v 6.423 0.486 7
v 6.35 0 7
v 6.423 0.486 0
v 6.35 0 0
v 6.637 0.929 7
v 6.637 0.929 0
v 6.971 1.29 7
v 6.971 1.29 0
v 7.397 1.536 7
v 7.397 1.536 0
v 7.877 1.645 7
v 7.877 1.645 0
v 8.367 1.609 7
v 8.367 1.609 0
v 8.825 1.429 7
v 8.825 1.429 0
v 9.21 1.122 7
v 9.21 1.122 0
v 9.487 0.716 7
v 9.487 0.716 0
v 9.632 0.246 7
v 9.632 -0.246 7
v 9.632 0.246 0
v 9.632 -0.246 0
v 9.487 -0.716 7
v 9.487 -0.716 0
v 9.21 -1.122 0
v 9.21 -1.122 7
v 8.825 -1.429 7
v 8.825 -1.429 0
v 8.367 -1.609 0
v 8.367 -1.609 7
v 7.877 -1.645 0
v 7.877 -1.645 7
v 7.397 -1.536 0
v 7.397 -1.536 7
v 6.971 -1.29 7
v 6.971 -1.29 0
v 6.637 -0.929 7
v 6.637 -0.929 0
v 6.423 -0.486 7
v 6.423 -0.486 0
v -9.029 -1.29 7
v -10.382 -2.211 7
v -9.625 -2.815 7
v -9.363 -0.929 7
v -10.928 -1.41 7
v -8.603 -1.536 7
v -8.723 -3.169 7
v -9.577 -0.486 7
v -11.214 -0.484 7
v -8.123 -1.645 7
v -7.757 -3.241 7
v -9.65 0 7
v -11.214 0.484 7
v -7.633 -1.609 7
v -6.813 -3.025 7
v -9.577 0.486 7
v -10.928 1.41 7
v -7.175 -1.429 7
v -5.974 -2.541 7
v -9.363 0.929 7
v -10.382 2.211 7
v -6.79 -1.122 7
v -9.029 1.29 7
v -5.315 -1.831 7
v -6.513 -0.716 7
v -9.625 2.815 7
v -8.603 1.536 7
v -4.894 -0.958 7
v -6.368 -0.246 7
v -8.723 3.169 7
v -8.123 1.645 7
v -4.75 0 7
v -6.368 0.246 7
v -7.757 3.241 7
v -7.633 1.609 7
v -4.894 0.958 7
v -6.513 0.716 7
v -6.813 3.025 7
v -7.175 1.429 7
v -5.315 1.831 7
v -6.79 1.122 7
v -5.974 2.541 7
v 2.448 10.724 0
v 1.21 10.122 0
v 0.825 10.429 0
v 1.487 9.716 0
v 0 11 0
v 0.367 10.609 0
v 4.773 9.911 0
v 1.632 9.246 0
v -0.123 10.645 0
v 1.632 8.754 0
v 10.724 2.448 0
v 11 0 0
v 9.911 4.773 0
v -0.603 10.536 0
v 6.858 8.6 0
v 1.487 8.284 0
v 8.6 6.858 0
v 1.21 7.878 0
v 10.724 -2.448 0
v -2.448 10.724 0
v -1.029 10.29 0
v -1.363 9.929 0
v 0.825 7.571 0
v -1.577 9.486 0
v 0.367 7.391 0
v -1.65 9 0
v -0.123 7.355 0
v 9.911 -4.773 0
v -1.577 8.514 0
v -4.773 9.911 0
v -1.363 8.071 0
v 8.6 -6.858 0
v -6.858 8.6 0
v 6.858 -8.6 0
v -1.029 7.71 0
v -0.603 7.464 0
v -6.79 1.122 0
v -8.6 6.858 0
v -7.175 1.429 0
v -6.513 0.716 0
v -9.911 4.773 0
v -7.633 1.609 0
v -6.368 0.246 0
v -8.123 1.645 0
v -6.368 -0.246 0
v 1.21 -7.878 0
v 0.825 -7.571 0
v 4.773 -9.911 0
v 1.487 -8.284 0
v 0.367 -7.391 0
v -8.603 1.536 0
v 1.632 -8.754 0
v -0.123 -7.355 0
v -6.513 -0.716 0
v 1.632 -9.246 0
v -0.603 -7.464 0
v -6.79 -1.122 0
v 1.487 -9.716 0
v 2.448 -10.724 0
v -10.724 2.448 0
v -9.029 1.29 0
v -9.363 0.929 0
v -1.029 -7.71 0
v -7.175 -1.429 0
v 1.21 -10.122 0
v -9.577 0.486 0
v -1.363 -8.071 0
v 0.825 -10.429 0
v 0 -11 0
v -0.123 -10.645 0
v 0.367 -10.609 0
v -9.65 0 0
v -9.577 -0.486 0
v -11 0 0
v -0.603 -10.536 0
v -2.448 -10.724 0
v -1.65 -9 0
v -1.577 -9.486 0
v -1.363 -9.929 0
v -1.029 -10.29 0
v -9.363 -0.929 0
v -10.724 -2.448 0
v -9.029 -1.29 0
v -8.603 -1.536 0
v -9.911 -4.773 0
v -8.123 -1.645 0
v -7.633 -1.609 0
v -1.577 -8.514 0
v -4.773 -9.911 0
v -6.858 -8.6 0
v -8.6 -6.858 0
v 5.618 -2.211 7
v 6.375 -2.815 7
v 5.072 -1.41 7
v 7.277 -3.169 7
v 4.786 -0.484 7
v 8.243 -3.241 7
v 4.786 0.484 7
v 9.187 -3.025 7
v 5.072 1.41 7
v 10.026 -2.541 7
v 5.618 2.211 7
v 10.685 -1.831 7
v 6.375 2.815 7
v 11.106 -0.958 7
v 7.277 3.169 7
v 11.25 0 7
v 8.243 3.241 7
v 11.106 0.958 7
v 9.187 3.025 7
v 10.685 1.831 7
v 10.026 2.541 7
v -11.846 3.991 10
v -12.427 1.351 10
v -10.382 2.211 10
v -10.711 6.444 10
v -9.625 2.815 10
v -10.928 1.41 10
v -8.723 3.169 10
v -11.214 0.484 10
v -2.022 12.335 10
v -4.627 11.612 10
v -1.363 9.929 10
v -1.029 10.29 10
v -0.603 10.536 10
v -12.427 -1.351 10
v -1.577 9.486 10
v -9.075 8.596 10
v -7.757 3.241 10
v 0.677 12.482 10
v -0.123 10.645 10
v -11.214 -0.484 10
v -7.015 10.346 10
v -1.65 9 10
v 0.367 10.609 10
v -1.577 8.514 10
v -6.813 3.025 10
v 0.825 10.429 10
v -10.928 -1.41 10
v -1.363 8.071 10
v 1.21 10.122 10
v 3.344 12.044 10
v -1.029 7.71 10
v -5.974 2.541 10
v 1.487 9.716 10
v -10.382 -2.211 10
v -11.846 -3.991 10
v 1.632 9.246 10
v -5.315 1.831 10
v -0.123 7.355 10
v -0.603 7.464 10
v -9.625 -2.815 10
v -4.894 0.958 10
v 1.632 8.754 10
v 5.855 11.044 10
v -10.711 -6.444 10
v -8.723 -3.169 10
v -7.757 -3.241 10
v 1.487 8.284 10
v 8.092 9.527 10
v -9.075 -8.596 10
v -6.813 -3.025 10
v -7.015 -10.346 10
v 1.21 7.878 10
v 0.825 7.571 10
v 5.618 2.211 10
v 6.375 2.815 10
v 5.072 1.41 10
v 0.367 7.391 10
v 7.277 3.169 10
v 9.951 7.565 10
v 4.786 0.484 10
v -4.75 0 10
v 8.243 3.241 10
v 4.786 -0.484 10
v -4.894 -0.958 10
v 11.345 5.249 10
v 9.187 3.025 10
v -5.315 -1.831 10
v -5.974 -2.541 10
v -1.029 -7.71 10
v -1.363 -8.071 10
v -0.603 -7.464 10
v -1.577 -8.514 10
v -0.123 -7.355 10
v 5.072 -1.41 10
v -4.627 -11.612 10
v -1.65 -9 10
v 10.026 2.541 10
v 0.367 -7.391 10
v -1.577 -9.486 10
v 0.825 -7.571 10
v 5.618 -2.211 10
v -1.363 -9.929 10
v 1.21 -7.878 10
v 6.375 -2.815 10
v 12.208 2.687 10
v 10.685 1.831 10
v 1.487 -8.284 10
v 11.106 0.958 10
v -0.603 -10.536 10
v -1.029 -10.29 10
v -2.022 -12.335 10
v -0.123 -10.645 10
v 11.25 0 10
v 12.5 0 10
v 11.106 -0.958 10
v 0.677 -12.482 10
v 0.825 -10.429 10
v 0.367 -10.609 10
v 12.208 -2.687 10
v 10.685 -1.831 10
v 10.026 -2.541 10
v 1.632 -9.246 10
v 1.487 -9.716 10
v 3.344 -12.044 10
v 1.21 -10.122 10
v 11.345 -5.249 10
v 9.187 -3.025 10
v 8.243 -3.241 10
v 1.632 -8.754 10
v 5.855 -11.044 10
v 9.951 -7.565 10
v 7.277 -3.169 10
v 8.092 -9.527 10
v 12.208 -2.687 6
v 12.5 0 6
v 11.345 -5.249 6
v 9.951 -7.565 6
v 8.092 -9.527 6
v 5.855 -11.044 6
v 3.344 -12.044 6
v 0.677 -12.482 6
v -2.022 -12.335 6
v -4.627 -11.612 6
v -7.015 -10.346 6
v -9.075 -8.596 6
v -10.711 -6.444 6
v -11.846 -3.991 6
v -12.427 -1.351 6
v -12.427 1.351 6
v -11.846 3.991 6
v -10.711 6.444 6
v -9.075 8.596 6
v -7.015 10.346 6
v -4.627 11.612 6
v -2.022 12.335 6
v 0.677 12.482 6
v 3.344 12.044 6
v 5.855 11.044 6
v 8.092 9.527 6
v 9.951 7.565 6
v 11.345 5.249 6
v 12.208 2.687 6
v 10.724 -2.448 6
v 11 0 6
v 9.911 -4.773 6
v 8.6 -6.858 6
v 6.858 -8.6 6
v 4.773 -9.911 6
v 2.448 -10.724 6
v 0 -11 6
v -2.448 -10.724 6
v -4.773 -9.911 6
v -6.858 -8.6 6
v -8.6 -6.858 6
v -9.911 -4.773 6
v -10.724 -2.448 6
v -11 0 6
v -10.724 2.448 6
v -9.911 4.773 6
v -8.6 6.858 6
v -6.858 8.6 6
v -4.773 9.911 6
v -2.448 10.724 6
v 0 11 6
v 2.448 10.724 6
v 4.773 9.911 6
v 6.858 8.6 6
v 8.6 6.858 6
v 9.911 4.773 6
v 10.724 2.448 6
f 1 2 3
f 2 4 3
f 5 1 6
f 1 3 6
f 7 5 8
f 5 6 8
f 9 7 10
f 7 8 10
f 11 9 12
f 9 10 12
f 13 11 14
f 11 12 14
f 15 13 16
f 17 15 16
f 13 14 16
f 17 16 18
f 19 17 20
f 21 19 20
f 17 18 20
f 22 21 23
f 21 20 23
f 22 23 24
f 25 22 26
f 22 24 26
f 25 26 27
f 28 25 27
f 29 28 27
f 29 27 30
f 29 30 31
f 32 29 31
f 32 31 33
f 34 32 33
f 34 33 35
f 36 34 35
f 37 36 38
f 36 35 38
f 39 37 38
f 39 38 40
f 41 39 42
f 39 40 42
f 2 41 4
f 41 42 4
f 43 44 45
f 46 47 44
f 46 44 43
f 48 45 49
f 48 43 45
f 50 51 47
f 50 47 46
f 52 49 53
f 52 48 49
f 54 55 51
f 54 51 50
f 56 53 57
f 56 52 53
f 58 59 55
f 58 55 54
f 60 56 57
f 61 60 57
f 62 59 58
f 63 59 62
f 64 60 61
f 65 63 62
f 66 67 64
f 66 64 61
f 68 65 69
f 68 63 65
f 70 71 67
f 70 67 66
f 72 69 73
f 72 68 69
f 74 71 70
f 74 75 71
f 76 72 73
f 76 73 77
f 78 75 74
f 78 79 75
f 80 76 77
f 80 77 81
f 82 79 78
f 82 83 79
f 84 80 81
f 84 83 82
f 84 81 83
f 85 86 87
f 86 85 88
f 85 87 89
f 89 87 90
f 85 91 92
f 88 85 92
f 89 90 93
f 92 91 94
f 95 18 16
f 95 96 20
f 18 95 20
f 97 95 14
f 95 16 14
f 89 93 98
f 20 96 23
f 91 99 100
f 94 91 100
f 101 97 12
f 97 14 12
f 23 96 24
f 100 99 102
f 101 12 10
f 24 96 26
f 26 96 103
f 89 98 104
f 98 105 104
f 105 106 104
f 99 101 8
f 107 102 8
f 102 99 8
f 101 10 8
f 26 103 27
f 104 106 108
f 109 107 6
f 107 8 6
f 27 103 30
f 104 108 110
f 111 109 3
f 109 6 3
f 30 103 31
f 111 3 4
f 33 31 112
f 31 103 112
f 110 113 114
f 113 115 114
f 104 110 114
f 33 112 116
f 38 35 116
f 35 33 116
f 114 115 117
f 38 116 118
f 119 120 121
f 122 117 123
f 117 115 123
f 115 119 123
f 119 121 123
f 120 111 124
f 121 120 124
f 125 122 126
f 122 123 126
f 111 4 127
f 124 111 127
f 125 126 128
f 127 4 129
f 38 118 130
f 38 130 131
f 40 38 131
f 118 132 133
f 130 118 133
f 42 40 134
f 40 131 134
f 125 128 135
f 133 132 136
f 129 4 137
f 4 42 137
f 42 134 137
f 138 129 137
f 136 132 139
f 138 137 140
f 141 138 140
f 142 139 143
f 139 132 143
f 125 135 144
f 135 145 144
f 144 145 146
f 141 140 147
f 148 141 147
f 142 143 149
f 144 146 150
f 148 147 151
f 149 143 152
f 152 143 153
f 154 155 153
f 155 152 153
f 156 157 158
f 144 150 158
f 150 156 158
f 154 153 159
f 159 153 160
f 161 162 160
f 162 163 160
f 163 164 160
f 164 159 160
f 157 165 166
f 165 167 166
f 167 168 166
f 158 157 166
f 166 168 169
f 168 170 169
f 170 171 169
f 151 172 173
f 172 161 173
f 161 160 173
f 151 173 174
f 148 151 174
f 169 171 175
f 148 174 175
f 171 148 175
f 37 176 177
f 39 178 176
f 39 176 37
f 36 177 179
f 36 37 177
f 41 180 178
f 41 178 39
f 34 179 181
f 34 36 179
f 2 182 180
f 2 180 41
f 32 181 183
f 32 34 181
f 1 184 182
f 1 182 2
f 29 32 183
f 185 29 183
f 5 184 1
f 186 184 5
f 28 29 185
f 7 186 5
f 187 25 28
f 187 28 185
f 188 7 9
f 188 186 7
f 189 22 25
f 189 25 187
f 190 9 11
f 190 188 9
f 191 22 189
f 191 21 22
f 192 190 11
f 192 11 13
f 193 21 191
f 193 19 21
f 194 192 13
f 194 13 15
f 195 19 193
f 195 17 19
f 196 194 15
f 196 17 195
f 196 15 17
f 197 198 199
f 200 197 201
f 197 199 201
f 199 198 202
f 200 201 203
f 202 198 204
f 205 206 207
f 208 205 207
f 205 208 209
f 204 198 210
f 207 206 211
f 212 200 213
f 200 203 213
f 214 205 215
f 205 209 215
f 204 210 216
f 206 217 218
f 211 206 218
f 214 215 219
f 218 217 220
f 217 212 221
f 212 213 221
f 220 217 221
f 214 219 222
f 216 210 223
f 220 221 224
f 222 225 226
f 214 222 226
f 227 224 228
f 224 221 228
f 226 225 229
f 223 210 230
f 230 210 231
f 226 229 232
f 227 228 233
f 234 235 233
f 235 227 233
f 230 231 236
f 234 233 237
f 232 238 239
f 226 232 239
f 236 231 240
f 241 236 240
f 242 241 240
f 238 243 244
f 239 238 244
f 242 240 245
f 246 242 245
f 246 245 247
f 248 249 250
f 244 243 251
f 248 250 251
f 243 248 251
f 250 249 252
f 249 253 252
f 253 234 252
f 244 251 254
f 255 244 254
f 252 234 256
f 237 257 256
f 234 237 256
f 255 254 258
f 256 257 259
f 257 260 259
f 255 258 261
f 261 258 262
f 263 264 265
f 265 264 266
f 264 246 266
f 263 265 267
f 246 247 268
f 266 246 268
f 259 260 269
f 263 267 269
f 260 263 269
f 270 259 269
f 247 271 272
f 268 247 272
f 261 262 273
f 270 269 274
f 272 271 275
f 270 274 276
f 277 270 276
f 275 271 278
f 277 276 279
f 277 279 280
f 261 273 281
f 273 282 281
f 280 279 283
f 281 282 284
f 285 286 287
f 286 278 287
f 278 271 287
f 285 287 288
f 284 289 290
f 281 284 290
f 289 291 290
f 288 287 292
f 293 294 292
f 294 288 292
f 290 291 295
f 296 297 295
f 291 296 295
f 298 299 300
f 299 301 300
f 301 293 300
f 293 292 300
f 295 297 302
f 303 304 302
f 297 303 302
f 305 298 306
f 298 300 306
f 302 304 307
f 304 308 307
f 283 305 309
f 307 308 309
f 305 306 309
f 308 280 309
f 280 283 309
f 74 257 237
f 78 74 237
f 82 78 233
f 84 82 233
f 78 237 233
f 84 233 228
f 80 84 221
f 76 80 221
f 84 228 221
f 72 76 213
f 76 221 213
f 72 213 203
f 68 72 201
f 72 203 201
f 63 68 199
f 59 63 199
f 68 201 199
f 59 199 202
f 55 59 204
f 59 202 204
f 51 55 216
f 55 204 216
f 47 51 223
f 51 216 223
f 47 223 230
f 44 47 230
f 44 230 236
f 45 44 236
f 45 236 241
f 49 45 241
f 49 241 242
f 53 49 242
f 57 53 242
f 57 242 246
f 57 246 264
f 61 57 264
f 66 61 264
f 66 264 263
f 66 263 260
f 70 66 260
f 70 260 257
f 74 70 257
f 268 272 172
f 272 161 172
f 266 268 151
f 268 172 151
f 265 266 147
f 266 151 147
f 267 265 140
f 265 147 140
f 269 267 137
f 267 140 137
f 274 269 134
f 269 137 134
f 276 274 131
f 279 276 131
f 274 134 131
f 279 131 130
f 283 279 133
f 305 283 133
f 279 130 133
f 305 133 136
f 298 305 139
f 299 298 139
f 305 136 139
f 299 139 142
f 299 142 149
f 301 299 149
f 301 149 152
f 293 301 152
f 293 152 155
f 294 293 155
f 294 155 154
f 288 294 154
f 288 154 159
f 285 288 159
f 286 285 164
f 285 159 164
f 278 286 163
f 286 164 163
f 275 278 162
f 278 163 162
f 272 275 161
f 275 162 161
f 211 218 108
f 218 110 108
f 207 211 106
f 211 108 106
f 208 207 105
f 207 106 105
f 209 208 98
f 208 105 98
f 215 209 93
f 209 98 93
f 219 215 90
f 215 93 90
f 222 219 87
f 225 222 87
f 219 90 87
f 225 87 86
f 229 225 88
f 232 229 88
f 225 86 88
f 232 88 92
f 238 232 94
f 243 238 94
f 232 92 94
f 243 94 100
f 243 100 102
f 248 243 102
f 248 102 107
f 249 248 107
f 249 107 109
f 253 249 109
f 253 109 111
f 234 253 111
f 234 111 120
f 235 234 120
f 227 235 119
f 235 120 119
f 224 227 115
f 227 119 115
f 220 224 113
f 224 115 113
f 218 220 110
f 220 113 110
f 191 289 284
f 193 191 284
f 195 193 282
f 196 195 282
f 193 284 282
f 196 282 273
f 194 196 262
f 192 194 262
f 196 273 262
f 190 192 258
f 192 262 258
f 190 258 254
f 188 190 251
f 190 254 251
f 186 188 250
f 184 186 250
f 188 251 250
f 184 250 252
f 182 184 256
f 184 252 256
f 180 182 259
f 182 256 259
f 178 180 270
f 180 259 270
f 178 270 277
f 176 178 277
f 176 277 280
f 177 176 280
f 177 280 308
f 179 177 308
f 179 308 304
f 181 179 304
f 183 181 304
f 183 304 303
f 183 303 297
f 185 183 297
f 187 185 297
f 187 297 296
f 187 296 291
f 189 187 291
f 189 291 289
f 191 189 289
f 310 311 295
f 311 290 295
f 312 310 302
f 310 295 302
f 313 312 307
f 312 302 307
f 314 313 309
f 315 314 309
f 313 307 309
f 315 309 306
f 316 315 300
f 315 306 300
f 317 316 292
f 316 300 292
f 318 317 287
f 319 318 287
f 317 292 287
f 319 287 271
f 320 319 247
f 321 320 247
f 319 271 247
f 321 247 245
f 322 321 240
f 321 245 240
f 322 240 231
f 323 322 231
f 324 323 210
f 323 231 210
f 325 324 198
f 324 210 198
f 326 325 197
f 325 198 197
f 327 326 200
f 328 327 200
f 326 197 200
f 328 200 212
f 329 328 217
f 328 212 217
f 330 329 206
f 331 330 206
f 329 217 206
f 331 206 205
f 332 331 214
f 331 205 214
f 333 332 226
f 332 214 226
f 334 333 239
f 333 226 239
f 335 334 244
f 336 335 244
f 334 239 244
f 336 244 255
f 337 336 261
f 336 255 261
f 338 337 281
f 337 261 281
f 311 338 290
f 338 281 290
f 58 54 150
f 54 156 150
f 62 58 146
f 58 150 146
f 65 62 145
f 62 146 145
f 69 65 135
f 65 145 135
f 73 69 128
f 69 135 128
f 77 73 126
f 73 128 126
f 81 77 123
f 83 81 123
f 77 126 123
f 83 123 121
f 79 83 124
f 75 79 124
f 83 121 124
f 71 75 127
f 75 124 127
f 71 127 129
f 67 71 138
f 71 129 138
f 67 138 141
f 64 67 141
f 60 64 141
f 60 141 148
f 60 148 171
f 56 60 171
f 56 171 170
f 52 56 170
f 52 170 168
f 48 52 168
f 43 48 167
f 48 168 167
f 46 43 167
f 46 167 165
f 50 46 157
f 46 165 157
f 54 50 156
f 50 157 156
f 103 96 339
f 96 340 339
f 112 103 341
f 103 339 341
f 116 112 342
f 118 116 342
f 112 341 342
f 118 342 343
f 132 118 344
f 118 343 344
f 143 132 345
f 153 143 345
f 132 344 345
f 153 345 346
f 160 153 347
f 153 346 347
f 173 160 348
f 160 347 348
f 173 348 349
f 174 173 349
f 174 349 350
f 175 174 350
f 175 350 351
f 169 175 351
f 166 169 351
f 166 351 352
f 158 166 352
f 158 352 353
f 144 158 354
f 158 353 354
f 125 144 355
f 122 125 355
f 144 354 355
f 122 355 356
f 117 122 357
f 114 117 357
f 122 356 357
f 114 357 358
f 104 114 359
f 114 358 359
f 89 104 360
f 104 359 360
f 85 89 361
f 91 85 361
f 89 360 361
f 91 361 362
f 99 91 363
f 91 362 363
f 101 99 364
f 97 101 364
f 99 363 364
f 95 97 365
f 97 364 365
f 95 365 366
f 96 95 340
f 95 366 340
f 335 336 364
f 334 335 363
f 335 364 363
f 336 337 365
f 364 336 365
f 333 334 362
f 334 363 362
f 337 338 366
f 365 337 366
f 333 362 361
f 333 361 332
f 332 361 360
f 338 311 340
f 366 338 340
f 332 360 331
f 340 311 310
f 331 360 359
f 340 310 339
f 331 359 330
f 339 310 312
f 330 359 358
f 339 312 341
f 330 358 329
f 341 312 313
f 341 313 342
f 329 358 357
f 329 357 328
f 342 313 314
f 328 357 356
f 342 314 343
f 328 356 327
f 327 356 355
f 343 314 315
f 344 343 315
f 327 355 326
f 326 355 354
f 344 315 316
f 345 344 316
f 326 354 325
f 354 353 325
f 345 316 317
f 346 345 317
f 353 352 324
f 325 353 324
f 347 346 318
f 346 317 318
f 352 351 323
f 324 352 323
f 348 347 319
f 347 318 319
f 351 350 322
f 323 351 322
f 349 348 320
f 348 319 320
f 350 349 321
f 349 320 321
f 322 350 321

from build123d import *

# Parameters (mm, degrees)
F3_D           = 3.3
F3_DEPTH       = 10
F3_TIP         = 0.9914200214
F4_D           = 3.3
F4_DEPTH       = 10
F4_CBORE_D     = 6.5
F4_CBORE_DEPTH = 3
F4_TIP         = 0.9914200214


with BuildPart() as f1:
    # F0 (on Front) → F1 (revolve)
    with BuildSketch(Plane.XZ):
        Polygon((0, 10), (0, 0), (11, 0), (11, 6), (12.5, 6), (12.5, 10), align=None)
    revolve(axis=Axis((0, 0, 5), (0, 0, -1)))

    # F3
    with Locations(Plane.XY.offset(10)):
        with Locations((0, 9), (0, -9)):
            Hole(F3_D / 2, depth=F3_DEPTH)
            with Locations((0, 0, -(F3_DEPTH + F3_TIP / 2))):  # 118° drill point
                Cone(0, F3_D / 2, F3_TIP, mode=Mode.SUBTRACT)

    # F4
    with Locations(Plane.XY.offset(10)):
        with Locations((-8, 0), (8, 0)):
            CounterBoreHole(F4_D / 2, F4_CBORE_D / 2, F4_CBORE_DEPTH, depth=F4_DEPTH)
            with Locations((0, 0, -(F4_DEPTH + F4_TIP / 2))):  # 118° drill point
                Cone(0, F4_D / 2, F4_TIP, mode=Mode.SUBTRACT)


solid = f1.part
